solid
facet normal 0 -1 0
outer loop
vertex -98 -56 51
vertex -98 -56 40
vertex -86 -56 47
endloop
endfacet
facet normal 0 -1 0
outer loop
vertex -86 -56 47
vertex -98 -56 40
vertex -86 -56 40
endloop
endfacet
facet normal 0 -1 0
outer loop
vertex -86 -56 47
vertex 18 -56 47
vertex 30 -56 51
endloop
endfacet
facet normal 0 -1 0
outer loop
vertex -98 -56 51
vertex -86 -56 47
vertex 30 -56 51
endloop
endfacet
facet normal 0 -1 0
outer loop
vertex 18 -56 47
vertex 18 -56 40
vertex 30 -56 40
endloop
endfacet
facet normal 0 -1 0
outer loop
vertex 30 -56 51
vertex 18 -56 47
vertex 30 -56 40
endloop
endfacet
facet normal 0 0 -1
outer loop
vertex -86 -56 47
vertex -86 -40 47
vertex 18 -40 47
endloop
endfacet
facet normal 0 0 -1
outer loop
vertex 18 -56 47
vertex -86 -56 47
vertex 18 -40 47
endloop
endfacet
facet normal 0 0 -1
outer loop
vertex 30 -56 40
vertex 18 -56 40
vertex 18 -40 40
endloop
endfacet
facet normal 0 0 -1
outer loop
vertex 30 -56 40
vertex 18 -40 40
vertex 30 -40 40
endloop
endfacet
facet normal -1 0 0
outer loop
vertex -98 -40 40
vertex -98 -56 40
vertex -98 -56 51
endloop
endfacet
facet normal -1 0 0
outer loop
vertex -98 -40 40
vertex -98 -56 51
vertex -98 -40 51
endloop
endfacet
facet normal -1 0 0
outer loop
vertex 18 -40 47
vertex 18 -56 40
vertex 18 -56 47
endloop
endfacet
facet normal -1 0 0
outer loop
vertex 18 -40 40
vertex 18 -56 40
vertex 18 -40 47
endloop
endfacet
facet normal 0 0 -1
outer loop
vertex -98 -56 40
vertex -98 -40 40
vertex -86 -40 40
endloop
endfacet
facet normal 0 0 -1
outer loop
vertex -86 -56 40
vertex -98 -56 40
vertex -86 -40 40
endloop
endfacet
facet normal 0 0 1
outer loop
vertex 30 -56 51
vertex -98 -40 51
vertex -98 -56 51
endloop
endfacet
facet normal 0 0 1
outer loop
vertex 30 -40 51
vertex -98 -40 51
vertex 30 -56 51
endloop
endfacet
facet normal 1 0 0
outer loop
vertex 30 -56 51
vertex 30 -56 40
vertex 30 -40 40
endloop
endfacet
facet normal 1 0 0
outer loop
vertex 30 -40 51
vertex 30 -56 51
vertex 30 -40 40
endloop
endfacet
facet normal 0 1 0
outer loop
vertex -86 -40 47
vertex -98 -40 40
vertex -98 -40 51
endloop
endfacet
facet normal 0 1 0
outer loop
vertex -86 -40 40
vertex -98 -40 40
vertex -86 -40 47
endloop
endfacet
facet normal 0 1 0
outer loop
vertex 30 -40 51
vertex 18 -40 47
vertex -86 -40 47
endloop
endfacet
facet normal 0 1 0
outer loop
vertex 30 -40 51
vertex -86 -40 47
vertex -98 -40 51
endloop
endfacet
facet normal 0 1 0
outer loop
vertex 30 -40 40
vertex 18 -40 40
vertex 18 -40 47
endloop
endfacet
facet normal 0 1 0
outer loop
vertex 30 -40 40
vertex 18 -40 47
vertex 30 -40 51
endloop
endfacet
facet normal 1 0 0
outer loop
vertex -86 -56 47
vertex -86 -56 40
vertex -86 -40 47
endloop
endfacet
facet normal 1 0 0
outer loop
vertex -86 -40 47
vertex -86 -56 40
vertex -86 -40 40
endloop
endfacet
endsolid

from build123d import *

# Parameters (mm, degrees)
BOX517_W     = 128
BOX517_H     = 16
BOX517_DEPTH = 4
BOX518_W     = 12
BOX518_H     = 16
BOX518_DEPTH = 11
BOX519_W     = 12
BOX519_H     = 16
BOX519_DEPTH = 11


with BuildPart() as box517:
    # Box517 → Box517 (new body)
    with BuildSketch(Plane(origin=(-98, -27, 47), x_dir=(1, 0, 0), z_dir=(0, 0, 1))):
        with Locations((64, 8)):
            Rectangle(BOX517_W, BOX517_H)
    extrude(amount=BOX517_DEPTH)


with BuildPart() as box518:
    # Box518 → Box518 (new body)
    with BuildSketch(Plane(origin=(-98, -27, 40), x_dir=(1, 0, 0), z_dir=(0, 0, 1))):
        with Locations((6, 8)):
            Rectangle(BOX518_W, BOX518_H)
    extrude(amount=BOX518_DEPTH)


with BuildPart() as fusion400:
    # Box519 → Box519 (new body)
    with BuildSketch(Plane(origin=(18, -27, 40), x_dir=(1, 0, 0), z_dir=(0, 0, 1))):
        with Locations((6, 8)):
            Rectangle(BOX519_W, BOX519_H)
    extrude(amount=BOX519_DEPTH)

    # Fusion400: union Box517, Box518
    add(box517.part)
    add(box518.part)


with BuildPart() as fusion400_1:
    # Fusion400 placement: moved
    add(fusion400.part.moved(Location((0, -29, 0))))


solid = fusion400_1.part
